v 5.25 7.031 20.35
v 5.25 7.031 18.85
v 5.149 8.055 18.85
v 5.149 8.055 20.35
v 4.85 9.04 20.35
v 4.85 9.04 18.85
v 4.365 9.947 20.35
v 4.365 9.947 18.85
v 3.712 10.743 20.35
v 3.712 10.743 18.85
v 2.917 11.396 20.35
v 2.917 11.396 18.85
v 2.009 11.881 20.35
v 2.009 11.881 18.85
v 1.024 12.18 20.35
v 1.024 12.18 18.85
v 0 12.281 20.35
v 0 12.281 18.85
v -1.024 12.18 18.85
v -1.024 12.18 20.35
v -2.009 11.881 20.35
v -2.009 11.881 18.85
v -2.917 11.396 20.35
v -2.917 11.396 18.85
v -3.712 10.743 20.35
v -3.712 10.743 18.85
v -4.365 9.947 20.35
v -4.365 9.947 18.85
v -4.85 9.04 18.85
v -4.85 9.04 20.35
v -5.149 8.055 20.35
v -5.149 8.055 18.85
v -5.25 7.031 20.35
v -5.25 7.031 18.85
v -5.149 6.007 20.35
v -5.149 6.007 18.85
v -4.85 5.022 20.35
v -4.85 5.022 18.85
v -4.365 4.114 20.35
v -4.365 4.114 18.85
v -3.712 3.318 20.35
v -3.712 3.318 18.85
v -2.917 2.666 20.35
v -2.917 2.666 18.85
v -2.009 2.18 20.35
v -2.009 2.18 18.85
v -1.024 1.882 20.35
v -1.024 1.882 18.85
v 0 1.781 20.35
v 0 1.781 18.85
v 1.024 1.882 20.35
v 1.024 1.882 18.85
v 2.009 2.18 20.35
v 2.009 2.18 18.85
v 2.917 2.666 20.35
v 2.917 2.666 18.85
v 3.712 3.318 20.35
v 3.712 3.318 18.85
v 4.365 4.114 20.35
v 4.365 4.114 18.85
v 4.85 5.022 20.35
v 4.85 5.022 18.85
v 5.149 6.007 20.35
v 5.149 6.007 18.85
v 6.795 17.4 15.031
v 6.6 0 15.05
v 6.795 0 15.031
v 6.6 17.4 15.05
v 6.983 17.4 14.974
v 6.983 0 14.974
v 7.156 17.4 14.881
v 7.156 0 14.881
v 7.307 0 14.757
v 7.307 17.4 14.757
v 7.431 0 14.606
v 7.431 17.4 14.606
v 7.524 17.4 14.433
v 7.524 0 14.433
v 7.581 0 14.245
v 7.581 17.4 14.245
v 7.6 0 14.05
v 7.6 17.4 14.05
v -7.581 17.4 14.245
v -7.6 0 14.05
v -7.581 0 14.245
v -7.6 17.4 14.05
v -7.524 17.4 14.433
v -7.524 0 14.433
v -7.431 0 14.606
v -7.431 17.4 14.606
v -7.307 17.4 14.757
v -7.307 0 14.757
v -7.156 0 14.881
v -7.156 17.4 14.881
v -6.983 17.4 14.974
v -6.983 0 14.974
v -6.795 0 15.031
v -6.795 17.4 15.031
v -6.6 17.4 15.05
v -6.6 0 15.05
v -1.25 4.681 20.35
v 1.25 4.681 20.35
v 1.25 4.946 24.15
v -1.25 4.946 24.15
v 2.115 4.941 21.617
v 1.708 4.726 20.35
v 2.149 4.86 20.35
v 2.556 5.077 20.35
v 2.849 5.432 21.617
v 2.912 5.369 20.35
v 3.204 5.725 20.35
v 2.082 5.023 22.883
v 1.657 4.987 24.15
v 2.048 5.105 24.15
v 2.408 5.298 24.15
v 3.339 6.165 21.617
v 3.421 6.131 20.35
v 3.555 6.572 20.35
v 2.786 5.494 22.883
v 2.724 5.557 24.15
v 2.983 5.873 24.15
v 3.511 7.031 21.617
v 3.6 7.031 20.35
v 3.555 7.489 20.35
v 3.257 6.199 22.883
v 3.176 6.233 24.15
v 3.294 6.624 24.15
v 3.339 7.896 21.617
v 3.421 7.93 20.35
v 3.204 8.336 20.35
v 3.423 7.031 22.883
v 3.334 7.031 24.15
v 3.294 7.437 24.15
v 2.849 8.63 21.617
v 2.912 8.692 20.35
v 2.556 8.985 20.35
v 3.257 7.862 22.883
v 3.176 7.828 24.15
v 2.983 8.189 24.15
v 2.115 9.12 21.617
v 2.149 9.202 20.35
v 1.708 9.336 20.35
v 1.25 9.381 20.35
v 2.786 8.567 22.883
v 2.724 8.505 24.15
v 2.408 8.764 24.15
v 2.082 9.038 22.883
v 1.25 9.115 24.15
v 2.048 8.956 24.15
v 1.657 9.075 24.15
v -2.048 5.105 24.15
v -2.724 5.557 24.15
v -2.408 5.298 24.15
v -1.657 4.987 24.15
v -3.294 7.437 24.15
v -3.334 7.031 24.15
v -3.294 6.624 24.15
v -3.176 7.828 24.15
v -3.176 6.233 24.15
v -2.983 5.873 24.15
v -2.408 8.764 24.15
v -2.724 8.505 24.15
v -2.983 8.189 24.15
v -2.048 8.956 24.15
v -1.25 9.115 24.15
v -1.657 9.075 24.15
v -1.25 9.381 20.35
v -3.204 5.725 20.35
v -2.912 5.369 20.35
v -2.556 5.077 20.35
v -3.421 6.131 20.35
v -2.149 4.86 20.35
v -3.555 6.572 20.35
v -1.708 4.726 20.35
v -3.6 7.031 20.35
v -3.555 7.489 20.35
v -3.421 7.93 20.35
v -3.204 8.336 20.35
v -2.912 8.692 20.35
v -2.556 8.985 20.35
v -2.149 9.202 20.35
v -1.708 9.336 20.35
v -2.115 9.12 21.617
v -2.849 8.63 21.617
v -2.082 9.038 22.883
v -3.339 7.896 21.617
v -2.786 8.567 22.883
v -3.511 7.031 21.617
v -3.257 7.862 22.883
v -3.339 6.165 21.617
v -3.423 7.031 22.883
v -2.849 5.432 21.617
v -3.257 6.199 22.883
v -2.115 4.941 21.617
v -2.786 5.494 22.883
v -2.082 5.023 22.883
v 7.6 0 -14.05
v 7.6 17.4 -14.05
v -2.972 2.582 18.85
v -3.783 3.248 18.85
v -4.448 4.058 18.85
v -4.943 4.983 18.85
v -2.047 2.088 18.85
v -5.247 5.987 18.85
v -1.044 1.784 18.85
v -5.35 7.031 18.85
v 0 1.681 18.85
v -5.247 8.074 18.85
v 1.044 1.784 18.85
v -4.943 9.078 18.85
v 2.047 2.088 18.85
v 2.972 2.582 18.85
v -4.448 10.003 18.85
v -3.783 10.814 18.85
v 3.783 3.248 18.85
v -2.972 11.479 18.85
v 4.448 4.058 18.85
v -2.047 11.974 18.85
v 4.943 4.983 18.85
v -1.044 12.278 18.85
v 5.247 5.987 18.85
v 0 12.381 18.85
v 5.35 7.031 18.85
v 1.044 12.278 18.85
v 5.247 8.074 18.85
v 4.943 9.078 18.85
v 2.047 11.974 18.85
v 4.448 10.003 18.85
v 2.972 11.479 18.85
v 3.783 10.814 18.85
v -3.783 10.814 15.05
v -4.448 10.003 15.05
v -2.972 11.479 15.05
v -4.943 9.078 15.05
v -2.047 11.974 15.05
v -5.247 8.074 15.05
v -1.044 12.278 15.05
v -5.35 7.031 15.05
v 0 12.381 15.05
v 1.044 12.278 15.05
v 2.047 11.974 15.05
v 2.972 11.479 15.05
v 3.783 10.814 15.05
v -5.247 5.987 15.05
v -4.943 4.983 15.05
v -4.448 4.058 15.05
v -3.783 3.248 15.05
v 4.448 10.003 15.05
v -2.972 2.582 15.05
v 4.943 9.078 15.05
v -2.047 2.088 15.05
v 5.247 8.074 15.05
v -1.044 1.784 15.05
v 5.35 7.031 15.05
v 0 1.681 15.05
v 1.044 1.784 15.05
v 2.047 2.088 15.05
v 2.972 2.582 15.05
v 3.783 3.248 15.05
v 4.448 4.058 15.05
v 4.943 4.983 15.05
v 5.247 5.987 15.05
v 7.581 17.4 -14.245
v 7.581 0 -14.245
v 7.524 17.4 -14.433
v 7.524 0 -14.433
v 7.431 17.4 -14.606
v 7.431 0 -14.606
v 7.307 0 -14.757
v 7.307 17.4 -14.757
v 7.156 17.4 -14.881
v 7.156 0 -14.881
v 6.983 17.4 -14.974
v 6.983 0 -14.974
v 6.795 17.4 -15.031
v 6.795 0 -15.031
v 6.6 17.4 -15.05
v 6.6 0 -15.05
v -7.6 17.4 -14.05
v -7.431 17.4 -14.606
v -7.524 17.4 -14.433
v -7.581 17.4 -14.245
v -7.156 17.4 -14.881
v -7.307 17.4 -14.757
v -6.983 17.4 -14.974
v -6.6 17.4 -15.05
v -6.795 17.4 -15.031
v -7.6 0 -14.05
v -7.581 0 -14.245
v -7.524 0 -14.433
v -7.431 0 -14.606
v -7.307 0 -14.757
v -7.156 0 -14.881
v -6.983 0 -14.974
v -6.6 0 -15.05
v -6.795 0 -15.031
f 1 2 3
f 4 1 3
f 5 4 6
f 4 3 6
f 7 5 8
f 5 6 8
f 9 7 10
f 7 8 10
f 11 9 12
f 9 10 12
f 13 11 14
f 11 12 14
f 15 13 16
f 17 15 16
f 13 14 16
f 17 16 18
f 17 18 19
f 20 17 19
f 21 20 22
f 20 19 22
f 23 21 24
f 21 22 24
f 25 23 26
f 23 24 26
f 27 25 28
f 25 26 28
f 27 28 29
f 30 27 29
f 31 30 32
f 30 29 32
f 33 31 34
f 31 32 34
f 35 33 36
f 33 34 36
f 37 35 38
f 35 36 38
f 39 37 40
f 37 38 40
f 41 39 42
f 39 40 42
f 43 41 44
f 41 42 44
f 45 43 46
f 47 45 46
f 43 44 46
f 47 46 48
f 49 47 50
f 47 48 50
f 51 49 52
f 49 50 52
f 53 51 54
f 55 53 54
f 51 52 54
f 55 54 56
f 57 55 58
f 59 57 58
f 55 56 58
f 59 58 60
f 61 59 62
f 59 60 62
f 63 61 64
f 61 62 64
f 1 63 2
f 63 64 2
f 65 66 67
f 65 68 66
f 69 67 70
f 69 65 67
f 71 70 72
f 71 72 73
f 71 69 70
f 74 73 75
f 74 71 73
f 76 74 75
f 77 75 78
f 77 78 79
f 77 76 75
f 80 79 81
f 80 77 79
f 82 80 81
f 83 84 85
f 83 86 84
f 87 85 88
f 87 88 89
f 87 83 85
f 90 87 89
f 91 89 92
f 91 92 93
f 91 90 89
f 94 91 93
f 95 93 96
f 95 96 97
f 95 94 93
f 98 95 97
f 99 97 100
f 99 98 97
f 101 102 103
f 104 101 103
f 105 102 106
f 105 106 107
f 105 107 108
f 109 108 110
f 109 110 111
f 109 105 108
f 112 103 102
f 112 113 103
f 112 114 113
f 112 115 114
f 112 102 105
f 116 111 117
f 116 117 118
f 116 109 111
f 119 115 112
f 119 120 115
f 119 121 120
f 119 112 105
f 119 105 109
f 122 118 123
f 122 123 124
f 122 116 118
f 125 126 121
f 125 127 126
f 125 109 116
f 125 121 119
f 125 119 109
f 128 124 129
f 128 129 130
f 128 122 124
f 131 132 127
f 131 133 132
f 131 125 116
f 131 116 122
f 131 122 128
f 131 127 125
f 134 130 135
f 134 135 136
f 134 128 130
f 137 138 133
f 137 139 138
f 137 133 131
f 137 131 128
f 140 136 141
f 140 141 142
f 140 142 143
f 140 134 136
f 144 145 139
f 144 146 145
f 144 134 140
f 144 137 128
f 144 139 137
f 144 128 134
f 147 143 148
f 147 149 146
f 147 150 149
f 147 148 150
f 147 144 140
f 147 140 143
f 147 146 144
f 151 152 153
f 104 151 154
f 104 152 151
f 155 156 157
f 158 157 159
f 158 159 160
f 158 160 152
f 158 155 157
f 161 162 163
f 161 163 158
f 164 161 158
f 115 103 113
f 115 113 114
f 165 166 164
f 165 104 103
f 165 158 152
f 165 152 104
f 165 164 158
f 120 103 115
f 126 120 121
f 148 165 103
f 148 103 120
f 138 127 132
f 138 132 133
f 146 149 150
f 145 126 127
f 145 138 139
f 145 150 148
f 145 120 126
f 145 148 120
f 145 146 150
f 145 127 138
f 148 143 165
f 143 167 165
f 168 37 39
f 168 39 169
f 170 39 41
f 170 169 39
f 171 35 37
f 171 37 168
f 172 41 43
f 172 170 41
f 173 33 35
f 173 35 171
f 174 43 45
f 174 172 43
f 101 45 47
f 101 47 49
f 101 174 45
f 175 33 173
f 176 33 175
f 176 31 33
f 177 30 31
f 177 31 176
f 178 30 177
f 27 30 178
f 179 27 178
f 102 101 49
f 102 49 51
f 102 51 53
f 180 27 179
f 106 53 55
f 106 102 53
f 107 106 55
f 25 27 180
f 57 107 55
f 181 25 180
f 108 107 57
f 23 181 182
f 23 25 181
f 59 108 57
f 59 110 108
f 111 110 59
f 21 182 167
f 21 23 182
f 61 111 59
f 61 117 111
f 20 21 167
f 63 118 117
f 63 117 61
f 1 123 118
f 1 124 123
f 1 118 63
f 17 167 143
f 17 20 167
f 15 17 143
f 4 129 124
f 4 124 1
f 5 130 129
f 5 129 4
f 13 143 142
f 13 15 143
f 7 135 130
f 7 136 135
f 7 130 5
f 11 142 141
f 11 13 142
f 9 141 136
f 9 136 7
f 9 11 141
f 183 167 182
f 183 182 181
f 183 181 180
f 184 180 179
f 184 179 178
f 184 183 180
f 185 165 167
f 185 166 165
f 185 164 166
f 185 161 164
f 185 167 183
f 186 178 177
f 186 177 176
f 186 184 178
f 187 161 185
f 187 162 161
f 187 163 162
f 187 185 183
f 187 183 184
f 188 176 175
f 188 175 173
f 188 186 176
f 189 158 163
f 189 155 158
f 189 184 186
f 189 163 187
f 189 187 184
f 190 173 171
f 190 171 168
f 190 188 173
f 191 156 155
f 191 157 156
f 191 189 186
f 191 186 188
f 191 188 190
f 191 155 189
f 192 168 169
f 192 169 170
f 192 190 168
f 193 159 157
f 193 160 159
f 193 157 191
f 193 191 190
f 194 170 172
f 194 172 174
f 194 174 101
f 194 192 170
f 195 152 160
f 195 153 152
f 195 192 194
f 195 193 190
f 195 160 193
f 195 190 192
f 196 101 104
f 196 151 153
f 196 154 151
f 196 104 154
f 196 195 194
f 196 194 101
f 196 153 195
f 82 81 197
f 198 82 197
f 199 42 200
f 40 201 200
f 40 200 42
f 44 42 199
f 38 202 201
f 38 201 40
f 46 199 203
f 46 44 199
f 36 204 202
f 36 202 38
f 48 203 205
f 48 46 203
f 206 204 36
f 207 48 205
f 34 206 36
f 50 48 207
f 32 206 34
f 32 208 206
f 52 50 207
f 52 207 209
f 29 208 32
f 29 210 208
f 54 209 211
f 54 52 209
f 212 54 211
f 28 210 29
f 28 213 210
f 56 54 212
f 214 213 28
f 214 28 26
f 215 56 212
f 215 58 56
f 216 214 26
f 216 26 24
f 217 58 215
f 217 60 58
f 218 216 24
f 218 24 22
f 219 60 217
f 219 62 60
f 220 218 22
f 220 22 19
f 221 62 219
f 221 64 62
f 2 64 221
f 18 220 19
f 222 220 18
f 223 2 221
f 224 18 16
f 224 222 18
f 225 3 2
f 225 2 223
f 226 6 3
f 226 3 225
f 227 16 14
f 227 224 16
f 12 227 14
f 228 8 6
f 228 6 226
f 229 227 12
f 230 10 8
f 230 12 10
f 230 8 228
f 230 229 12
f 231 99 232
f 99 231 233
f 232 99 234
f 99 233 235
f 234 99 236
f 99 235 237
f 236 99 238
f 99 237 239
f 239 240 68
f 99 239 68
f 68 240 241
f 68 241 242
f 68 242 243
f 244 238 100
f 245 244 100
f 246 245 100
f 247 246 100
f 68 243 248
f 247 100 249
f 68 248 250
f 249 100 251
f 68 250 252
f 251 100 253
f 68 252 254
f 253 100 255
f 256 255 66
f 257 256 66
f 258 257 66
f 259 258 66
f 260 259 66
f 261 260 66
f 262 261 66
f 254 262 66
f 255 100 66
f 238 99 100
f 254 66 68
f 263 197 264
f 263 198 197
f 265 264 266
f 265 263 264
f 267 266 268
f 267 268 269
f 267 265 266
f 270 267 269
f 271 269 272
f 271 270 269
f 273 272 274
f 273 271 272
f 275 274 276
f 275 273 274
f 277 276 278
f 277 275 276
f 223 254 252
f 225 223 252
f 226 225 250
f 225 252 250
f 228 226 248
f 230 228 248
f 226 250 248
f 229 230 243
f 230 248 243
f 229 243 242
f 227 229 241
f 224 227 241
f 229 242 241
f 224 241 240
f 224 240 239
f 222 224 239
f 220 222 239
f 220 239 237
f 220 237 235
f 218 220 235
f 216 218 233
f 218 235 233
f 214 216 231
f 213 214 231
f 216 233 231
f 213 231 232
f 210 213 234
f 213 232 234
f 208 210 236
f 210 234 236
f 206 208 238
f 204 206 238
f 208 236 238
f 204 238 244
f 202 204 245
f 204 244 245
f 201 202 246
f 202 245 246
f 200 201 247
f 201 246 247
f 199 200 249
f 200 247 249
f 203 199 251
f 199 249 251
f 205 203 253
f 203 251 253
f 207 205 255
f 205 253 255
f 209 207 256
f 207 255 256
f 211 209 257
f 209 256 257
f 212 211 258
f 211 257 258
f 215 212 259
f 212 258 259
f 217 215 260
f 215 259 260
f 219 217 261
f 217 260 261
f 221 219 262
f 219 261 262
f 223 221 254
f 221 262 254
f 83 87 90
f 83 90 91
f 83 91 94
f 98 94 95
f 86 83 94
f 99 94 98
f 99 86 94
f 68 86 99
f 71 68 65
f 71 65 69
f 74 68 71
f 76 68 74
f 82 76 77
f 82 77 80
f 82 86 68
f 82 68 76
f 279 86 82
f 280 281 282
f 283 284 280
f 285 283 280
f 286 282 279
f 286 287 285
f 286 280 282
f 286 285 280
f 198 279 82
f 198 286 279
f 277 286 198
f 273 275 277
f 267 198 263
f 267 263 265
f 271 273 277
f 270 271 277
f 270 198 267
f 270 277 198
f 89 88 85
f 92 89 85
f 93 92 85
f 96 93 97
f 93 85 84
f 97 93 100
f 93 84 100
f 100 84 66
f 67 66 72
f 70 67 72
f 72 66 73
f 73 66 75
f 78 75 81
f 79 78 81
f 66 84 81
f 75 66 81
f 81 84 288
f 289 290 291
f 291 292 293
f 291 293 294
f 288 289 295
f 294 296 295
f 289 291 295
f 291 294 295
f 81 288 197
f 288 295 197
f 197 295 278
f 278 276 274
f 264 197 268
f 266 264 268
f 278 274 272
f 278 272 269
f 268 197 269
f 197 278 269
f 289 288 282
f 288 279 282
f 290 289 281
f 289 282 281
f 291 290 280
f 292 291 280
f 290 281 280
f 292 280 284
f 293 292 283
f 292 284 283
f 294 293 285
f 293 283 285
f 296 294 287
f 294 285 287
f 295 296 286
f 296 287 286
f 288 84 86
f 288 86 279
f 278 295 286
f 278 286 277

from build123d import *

# Parameters (mm, degrees)
SKETCH1_W           = 15.2
SKETCH1_H           = 30.1
BOSS_EXTRUDE1_DEPTH = 17.4
FILLET1_R           = 1
SKETCH3_R           = 5.35
BOSS_EXTRUDE2_DEPTH = 3.8
SKETCH4_R           = 5.25
BOSS_EXTRUDE3_DEPTH = 1.5
BOSS_EXTRUDE4_DEPTH = 3.8
BOSS_EXTRUDE4_TAPER = 4


with BuildPart() as part:
    # Sketch1 → Boss-Extrude1 (new body)
    with BuildSketch(Plane(origin=(0, 0, 0), x_dir=(1, 0, 0), z_dir=(0, 1, 0))):
        Rectangle(SKETCH1_W, SKETCH1_H)
    extrude(amount=BOSS_EXTRUDE1_DEPTH)

    # Fillet1
    fillet1_edges = [part.edges().sort_by_distance(p)[0] for p in [
        (-7.6, 8.7, -15.05),
        (7.6, 8.7, -15.05),
        (7.6, 8.7, 15.05),
        (-7.6, 8.7, 15.05),
    ]]
    fillet(fillet1_edges, radius=FILLET1_R)

    # Sketch3 → Boss-Extrude2 (add)
    with BuildSketch(Plane.XY.offset(15.05)):
        with Locations((0, 7.030745518)):
            Circle(SKETCH3_R)
    extrude(amount=BOSS_EXTRUDE2_DEPTH)

    # Sketch4 → Boss-Extrude3 (add)
    with BuildSketch(Plane.XY.offset(18.85)):
        with Locations((0, 7.030745518)):
            Circle(SKETCH4_R)
    extrude(amount=BOSS_EXTRUDE3_DEPTH)

    # Sketch5 → Boss-Extrude4 (add)
    with BuildSketch(Plane.XY.offset(20.35)):
        with BuildLine():
            ThreePointArc((-1.25, 9.380745518), (-3.6, 7.030745518), (-1.25, 4.680745518))
            Line((-1.25, 4.680745518), (1.25, 4.680745518))
            ThreePointArc((1.25, 4.680745518), (3.6, 7.030745518), (1.25, 9.380745518))
            Line((1.25, 9.380745518), (-1.25, 9.380745518))
        make_face()
    extrude(amount=BOSS_EXTRUDE4_DEPTH, taper=BOSS_EXTRUDE4_TAPER)


solid = part.part
